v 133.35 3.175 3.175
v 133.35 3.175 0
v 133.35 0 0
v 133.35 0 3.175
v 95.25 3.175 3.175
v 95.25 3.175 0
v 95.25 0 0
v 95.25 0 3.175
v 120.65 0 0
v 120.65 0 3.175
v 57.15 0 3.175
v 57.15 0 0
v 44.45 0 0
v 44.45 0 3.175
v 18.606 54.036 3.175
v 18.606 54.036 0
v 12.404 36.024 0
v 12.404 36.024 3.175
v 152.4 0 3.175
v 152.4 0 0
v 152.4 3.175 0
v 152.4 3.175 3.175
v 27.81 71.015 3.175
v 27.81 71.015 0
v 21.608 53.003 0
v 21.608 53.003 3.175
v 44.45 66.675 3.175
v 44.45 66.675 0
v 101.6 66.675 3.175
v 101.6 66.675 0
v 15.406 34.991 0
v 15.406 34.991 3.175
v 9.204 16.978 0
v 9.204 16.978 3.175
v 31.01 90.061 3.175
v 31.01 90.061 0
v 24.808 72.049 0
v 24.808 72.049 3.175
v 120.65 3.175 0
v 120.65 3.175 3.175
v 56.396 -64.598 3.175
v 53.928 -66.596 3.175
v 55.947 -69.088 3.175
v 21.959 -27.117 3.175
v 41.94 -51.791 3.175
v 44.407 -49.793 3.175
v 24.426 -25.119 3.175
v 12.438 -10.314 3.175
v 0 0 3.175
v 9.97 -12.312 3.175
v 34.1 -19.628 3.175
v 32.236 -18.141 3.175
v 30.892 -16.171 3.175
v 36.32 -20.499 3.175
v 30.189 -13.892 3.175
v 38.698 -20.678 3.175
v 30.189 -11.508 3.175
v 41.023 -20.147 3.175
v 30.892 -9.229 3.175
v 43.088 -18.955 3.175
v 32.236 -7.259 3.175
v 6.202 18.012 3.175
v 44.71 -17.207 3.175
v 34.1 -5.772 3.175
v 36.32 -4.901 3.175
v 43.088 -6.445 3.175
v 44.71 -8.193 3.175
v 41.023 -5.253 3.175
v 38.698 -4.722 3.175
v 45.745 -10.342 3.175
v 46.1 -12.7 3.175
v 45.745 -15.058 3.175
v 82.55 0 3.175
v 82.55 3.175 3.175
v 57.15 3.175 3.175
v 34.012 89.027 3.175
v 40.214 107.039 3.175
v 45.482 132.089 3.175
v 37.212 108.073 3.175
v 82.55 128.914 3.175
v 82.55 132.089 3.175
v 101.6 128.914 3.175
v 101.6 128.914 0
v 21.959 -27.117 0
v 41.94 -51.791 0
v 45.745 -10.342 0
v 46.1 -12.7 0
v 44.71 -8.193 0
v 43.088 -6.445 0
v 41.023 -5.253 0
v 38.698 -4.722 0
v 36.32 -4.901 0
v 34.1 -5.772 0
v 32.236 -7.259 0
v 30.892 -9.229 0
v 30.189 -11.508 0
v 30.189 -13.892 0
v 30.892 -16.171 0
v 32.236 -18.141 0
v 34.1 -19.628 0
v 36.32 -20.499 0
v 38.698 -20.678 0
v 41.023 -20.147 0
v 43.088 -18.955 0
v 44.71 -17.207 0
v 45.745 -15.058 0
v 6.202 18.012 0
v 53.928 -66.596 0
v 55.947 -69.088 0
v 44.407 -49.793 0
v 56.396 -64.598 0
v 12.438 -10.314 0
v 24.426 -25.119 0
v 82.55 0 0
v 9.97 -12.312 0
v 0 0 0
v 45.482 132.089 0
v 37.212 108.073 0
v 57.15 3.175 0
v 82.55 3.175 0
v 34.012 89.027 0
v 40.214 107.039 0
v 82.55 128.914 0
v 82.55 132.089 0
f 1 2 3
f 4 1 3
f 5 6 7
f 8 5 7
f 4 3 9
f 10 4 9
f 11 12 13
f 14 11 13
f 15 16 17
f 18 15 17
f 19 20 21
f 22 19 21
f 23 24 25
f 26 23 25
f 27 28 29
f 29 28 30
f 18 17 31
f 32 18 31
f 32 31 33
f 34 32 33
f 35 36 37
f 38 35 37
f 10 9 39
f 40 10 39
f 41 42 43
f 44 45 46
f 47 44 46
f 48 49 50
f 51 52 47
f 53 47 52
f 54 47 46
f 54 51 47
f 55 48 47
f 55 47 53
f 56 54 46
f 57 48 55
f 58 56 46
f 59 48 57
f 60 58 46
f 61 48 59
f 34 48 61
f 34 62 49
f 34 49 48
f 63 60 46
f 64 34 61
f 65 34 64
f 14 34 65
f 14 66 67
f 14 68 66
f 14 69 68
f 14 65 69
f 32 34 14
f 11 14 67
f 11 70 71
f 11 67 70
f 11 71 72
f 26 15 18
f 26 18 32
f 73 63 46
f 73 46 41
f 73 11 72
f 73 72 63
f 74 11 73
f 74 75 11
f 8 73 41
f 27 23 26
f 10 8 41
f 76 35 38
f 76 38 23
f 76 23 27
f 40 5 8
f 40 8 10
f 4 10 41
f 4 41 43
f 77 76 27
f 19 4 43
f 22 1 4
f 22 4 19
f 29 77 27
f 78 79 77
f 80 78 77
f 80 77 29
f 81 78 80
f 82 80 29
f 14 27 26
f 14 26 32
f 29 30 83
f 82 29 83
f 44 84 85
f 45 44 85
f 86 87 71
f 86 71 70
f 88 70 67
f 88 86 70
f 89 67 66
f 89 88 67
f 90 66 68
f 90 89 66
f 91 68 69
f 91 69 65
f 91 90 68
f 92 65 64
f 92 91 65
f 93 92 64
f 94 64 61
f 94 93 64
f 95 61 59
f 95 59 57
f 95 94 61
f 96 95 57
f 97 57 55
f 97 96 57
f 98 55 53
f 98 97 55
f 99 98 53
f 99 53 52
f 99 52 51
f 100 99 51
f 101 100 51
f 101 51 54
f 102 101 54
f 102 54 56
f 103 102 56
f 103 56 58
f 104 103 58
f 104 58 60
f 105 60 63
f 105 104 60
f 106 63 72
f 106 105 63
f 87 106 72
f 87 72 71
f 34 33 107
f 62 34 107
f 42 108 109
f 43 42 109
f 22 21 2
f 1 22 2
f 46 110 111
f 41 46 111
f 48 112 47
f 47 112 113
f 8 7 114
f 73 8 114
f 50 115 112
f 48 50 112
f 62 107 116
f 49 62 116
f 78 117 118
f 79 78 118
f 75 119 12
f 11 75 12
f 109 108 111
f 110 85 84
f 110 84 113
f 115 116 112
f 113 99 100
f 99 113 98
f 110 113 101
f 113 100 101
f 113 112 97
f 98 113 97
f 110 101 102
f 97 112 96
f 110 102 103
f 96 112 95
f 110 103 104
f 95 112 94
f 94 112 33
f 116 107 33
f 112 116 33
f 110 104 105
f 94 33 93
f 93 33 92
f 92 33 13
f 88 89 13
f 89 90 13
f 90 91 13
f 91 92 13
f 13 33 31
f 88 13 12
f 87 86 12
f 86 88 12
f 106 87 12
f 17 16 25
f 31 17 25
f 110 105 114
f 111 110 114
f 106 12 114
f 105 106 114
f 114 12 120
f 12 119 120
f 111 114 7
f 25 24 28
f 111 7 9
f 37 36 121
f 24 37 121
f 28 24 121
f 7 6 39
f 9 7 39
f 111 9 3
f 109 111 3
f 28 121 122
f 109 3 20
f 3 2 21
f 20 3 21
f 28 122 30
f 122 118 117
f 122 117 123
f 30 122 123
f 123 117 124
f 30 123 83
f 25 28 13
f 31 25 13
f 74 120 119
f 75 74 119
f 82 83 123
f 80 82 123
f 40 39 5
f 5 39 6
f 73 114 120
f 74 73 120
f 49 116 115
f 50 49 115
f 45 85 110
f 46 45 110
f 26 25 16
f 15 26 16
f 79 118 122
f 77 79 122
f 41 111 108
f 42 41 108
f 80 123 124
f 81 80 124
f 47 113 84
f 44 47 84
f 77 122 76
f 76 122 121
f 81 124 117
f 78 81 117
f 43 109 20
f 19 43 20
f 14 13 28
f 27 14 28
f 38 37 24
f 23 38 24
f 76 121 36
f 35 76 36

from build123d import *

# Parameters (mm, degrees)
SKETCH1_R           = 8
BOSS_EXTRUDE1_DEPTH = 3.175


with BuildPart() as part:
    # Sketch1 → Boss-Extrude1 (new body)
    with BuildSketch(Plane.XY):
        Polygon((45.481871178, 132.088945011), (37.212440054, 108.072773191), (40.214461532, 107.039094301), (34.01238819, 89.026965435), (31.010366712, 90.060644326), (24.80829337, 72.048515461), (27.810314847, 71.01483657), (21.608241505, 53.002707705), (18.606220027, 54.036386596), (12.404146685, 36.02425773), (15.406168162, 34.99057884), (9.20409482, 16.978449975), (6.202073342, 18.012128865), (0, 0), (9.97035014, -12.312357038), (12.437788568, -10.314264796), (24.426342017, -25.118895362), (21.95890359, -27.116987604), (41.939826006, -51.79137188), (44.407264433, -49.793279638), (56.395817883, -64.597910204), (53.928379455, -66.596002446), (55.946582764, -69.088275974), (152.4, 0), (152.4, 3.175), (133.35, 3.175), (133.35, 0), (120.65, 0), (120.65, 3.175), (95.25, 3.175), (95.25, 0), (82.55, 0), (82.55, 3.175), (57.15, 3.175), (57.15, 0), (44.45, 0), (44.45, 3.175), (44.45, 66.675), (101.6, 66.675), (101.6, 128.913945011), (82.55, 128.913945011), (82.55, 132.088945011), align=None)
        with Locations((38.1, -12.7)):
            Circle(SKETCH1_R, mode=Mode.SUBTRACT)
    extrude(amount=BOSS_EXTRUDE1_DEPTH)


solid = part.part
